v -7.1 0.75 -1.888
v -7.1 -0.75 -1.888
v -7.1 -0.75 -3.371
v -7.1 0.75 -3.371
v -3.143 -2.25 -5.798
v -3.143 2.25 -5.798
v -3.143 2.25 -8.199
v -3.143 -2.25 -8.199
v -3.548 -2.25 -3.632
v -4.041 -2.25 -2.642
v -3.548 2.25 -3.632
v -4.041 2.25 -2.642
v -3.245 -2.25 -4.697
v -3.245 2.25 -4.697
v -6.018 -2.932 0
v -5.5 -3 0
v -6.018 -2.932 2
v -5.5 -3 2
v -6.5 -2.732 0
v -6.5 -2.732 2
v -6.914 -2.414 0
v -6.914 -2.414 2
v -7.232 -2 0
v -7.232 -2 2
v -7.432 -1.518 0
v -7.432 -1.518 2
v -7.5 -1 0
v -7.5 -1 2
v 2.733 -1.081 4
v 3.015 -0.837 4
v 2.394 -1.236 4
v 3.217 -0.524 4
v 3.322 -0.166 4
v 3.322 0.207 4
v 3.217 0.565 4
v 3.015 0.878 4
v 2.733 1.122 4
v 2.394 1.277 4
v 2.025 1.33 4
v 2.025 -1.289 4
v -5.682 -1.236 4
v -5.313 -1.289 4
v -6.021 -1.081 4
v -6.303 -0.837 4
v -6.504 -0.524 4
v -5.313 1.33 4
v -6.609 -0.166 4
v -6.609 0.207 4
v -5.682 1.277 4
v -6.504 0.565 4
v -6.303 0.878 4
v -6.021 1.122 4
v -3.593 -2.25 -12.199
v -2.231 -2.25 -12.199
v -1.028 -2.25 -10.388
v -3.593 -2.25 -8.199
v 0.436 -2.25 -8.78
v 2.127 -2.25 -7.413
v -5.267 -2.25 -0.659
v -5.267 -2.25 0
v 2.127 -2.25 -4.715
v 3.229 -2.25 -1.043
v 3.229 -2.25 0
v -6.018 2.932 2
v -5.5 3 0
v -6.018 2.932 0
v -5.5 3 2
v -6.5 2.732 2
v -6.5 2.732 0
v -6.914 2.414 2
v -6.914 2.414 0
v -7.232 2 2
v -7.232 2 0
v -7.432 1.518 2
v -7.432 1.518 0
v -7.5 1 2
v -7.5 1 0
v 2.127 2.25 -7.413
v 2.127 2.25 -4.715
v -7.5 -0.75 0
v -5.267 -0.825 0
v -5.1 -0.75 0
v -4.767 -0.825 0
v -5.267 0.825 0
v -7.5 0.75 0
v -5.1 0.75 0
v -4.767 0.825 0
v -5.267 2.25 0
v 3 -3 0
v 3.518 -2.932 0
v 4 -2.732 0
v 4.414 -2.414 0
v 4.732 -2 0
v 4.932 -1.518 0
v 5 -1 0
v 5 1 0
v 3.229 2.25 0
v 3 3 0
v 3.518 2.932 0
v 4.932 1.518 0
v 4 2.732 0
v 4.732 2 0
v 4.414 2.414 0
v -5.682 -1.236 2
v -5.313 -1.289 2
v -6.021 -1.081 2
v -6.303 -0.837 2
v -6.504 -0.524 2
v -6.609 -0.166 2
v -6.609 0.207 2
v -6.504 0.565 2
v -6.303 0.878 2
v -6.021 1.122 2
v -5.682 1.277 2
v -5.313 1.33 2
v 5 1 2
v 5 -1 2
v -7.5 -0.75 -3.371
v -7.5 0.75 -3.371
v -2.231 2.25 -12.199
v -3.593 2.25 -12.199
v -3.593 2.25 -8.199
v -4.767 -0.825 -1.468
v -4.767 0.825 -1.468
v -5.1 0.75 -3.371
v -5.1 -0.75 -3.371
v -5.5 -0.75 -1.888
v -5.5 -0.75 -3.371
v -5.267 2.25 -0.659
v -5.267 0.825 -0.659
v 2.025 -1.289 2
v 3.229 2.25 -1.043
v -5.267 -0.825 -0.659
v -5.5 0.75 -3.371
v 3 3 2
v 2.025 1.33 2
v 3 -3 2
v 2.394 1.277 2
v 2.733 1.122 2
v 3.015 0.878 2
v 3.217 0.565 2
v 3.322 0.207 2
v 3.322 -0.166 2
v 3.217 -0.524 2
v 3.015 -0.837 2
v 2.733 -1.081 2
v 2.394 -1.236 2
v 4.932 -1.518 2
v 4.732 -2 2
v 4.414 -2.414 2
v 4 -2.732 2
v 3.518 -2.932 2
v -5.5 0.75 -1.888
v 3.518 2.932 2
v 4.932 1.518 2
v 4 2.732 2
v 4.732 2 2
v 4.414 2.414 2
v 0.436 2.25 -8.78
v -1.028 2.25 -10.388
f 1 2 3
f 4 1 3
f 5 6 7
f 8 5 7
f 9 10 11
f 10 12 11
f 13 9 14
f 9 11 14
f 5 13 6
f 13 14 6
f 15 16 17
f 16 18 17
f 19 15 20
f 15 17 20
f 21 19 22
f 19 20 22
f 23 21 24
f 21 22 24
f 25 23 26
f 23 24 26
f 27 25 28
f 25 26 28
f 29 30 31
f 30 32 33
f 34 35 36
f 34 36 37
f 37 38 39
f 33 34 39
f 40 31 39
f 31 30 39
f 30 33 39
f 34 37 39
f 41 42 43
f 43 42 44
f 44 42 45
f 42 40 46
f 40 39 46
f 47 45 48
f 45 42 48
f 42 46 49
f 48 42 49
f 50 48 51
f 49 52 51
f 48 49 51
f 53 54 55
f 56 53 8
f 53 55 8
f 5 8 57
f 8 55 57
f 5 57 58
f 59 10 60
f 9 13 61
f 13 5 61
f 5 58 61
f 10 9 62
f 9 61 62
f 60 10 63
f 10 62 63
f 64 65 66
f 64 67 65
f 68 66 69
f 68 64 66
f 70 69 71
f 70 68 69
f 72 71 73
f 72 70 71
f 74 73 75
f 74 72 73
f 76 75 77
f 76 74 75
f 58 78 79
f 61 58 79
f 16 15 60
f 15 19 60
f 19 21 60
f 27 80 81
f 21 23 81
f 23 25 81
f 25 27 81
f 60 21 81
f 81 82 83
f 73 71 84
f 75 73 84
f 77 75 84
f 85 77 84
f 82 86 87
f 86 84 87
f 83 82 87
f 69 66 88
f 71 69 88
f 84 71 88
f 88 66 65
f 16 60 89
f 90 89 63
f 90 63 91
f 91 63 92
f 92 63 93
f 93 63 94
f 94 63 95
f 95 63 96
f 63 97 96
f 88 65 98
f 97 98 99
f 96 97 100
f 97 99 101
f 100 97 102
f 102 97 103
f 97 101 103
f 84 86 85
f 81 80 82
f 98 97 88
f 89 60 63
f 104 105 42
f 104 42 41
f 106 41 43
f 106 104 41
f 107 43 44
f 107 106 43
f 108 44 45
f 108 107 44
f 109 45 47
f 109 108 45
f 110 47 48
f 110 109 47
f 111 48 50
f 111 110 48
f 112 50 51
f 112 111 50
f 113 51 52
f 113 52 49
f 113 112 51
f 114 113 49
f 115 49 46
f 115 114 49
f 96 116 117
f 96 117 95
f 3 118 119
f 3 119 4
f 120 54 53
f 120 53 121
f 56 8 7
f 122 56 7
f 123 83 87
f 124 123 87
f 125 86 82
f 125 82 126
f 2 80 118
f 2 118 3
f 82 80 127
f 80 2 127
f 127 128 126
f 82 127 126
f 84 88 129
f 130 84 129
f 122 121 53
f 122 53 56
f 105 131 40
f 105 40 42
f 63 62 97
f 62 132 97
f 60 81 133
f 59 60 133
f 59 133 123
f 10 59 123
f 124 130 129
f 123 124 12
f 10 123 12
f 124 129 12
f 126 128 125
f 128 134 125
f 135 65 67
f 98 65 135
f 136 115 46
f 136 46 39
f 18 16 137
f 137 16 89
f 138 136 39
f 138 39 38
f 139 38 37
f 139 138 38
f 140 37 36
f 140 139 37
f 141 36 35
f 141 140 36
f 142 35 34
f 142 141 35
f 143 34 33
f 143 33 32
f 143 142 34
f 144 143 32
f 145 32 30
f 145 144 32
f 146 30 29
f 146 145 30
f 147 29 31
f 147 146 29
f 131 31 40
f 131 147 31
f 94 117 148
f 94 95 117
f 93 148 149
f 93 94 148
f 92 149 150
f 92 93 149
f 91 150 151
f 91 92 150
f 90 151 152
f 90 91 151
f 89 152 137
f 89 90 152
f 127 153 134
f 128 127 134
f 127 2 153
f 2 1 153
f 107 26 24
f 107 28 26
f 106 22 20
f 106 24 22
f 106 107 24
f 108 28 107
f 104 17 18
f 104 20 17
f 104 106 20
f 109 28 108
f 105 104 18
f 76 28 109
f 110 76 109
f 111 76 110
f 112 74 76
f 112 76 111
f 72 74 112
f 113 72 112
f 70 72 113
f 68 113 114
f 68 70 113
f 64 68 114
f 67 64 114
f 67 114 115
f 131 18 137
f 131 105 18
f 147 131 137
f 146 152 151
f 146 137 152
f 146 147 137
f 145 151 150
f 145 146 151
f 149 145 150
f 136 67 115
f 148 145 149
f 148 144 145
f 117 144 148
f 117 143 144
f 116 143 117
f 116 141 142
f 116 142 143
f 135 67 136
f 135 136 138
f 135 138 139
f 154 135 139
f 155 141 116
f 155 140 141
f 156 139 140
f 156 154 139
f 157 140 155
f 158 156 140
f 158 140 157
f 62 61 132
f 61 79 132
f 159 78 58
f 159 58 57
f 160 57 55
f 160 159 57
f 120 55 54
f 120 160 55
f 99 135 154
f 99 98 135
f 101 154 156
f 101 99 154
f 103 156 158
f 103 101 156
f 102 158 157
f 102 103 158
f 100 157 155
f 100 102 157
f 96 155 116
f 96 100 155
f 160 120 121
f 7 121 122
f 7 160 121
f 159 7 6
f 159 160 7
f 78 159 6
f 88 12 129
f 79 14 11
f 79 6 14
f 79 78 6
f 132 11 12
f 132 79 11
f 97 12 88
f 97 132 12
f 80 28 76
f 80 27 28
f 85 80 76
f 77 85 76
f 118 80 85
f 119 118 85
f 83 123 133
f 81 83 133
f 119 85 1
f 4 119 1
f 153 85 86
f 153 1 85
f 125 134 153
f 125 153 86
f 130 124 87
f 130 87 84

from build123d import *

# Parameters (mm, degrees)
SKETCH1_W            = 15
SKETCH1_H            = 6
BOSS_EXTRUDE1_DEPTH  = 2
BOSS_EXTRUDE2_DEPTH  = 2
BOSS_EXTRUDE3_DEPTH  = 2.25
SKETCH4_W            = 2
SKETCH4_H            = 6
CUT_EXTRUDE1_DEPTH   = 2.5
SKETCH7_W            = 4
SKETCH7_H            = 4.5
BOSS_EXTRUDE4_DEPTH  = 0.45
SKETCH14_W           = 0.5
SKETCH14_H           = 1.65
CUT_EXTRUDE5_DEPTH   = 2
SKETCH8_W            = 0.4
SKETCH8_H            = 3.371005291
BOSS_EXTRUDE5_DEPTH  = 0.75
CUT_EXTRUDE4_DEPTH   = 4.5
SKETCH12_W           = 1.6
SKETCH12_H           = 1.887701739
BOSS_EXTRUDE10_DEPTH = 0.75
FILLET1_R            = 2


with BuildPart() as part:
    # Sketch1 → Boss-Extrude1 (new body)
    with BuildSketch(Plane.XY):
        Rectangle(SKETCH1_W, SKETCH1_H)
    extrude(amount=BOSS_EXTRUDE1_DEPTH)

    # Sketch2 → Boss-Extrude2 (add)
    with BuildSketch(Plane.XY.offset(2)):
        with BuildLine():
            Line((-5.312816027, 1.330227393), (2.025172286, 1.330227393))
            ThreePointArc((2.025172286, 1.330227393), (3.334872121, 0.020527559), (2.025172286, -1.289172275))
            Line((2.025172286, -1.289172275), (-5.312816027, -1.289172275))
            ThreePointArc((-5.312816027, -1.289172275), (-6.622515861, 0.020527559), (-5.312816027, 1.330227393))
        make_face()
    extrude(amount=BOSS_EXTRUDE2_DEPTH)

    # Sketch3 → Boss-Extrude3 (add, symmetric)
    with BuildSketch(Plane(origin=(0, 0, 0), x_dir=(1, 0, 0), z_dir=(0, 1, 0))):
        with BuildLine():
            Line((-5.267009627, 0.659268098), (-4.040664768, 2.641993005))
            ThreePointArc((-4.040664768, 2.641993005), (-3.372127042, 4.157552016), (-3.143471892, 5.798155145))
            Line((-3.143471892, 5.798155145), (-3.143471892, 7.885245495))
            Line((-3.143471892, 7.885245495), (-3.143471892, 12.19944937))
            Line((-3.143471892, 12.19944937), (2.127297199, 12.19944937))
            Line((2.127297199, 12.19944937), (2.127297199, 7.885245495))
            Line((2.127297199, 7.885245495), (2.127297199, 4.714947067))
            Line((2.127297199, 4.714947067), (3.22873188, 1.042912685))
            Line((3.22873188, 1.042912685), (3.22873188, 0))
            Line((3.22873188, 0), (-5.267009627, 0))
            Line((-5.267009627, 0), (-5.267009627, 0.659268098))
        make_face()
    extrude(amount=BOSS_EXTRUDE3_DEPTH, both=True)

    # Sketch4 → Cut-Extrude1 (cut)
    with BuildSketch(Plane(origin=(7.5, 0, 0), x_dir=(0, 0, -1), z_dir=(1, 0, 0))):
        with Locations((-1, 0)):
            Rectangle(SKETCH4_W, SKETCH4_H)
    extrude(amount=-CUT_EXTRUDE1_DEPTH, mode=Mode.SUBTRACT)

    # Sketch7 → Boss-Extrude4 (add)
    with BuildSketch(Plane.ZY.offset(3.143471892)):
        with Locations((-10.19944937, 0)):
            Rectangle(SKETCH7_W, SKETCH7_H)
    extrude(amount=BOSS_EXTRUDE4_DEPTH)

    # Sketch14 → Cut-Extrude5 (cut)
    with BuildSketch(Plane(origin=(0, 0, 0), x_dir=(-1, 0, 0), z_dir=(0, 0, -1))):
        with Locations((5.017009627, 0)):
            Rectangle(SKETCH14_W, SKETCH14_H)
    extrude(amount=CUT_EXTRUDE5_DEPTH, mode=Mode.SUBTRACT)

    # Sketch8 → Boss-Extrude5 (add, symmetric)
    with BuildSketch(Plane(origin=(0, 0, 0), x_dir=(1, 0, 0), z_dir=(0, 1, 0))):
        with Locations((-7.3, 1.685502646)):
            Rectangle(SKETCH8_W, SKETCH8_H)
        with Locations((-5.3, 1.685502646)):
            Rectangle(SKETCH8_W, SKETCH8_H)
    extrude(amount=BOSS_EXTRUDE5_DEPTH, both=True)

    # Sketch11 → Cut-Extrude4 (cut)
    with BuildSketch(Plane(origin=(0, 2.25, 0), x_dir=(1, 0, 0), z_dir=(0, 1, 0))):
        with BuildLine():
            Line((-2.230616354, 12.19944937), (2.127297199, 12.19944937))
            Line((2.127297199, 12.19944937), (2.127297199, 7.412882239))
            ThreePointArc((2.127297199, 7.412882239), (-0.326306783, 9.556114202), (-2.230616354, 12.19944937))
        make_face()
    extrude(amount=-CUT_EXTRUDE4_DEPTH, mode=Mode.SUBTRACT)

    # Sketch12 → Boss-Extrude10 (add, symmetric)
    with BuildSketch(Plane(origin=(0, 0, 0), x_dir=(1, 0, 0), z_dir=(0, 1, 0))):
        with Locations((-6.3, 0.94385087)):
            Rectangle(SKETCH12_W, SKETCH12_H)
    extrude(amount=BOSS_EXTRUDE10_DEPTH, both=True)

    # Fillet1
    fillet1_edges = [part.edges().sort_by_distance(p)[0] for p in [
        (5, -3, 1),
        (5, 3, 1),
        (-7.5, -3, 1),
        (-7.5, 3, 1),
    ]]
    fillet(fillet1_edges, radius=FILLET1_R)


solid = part.part
